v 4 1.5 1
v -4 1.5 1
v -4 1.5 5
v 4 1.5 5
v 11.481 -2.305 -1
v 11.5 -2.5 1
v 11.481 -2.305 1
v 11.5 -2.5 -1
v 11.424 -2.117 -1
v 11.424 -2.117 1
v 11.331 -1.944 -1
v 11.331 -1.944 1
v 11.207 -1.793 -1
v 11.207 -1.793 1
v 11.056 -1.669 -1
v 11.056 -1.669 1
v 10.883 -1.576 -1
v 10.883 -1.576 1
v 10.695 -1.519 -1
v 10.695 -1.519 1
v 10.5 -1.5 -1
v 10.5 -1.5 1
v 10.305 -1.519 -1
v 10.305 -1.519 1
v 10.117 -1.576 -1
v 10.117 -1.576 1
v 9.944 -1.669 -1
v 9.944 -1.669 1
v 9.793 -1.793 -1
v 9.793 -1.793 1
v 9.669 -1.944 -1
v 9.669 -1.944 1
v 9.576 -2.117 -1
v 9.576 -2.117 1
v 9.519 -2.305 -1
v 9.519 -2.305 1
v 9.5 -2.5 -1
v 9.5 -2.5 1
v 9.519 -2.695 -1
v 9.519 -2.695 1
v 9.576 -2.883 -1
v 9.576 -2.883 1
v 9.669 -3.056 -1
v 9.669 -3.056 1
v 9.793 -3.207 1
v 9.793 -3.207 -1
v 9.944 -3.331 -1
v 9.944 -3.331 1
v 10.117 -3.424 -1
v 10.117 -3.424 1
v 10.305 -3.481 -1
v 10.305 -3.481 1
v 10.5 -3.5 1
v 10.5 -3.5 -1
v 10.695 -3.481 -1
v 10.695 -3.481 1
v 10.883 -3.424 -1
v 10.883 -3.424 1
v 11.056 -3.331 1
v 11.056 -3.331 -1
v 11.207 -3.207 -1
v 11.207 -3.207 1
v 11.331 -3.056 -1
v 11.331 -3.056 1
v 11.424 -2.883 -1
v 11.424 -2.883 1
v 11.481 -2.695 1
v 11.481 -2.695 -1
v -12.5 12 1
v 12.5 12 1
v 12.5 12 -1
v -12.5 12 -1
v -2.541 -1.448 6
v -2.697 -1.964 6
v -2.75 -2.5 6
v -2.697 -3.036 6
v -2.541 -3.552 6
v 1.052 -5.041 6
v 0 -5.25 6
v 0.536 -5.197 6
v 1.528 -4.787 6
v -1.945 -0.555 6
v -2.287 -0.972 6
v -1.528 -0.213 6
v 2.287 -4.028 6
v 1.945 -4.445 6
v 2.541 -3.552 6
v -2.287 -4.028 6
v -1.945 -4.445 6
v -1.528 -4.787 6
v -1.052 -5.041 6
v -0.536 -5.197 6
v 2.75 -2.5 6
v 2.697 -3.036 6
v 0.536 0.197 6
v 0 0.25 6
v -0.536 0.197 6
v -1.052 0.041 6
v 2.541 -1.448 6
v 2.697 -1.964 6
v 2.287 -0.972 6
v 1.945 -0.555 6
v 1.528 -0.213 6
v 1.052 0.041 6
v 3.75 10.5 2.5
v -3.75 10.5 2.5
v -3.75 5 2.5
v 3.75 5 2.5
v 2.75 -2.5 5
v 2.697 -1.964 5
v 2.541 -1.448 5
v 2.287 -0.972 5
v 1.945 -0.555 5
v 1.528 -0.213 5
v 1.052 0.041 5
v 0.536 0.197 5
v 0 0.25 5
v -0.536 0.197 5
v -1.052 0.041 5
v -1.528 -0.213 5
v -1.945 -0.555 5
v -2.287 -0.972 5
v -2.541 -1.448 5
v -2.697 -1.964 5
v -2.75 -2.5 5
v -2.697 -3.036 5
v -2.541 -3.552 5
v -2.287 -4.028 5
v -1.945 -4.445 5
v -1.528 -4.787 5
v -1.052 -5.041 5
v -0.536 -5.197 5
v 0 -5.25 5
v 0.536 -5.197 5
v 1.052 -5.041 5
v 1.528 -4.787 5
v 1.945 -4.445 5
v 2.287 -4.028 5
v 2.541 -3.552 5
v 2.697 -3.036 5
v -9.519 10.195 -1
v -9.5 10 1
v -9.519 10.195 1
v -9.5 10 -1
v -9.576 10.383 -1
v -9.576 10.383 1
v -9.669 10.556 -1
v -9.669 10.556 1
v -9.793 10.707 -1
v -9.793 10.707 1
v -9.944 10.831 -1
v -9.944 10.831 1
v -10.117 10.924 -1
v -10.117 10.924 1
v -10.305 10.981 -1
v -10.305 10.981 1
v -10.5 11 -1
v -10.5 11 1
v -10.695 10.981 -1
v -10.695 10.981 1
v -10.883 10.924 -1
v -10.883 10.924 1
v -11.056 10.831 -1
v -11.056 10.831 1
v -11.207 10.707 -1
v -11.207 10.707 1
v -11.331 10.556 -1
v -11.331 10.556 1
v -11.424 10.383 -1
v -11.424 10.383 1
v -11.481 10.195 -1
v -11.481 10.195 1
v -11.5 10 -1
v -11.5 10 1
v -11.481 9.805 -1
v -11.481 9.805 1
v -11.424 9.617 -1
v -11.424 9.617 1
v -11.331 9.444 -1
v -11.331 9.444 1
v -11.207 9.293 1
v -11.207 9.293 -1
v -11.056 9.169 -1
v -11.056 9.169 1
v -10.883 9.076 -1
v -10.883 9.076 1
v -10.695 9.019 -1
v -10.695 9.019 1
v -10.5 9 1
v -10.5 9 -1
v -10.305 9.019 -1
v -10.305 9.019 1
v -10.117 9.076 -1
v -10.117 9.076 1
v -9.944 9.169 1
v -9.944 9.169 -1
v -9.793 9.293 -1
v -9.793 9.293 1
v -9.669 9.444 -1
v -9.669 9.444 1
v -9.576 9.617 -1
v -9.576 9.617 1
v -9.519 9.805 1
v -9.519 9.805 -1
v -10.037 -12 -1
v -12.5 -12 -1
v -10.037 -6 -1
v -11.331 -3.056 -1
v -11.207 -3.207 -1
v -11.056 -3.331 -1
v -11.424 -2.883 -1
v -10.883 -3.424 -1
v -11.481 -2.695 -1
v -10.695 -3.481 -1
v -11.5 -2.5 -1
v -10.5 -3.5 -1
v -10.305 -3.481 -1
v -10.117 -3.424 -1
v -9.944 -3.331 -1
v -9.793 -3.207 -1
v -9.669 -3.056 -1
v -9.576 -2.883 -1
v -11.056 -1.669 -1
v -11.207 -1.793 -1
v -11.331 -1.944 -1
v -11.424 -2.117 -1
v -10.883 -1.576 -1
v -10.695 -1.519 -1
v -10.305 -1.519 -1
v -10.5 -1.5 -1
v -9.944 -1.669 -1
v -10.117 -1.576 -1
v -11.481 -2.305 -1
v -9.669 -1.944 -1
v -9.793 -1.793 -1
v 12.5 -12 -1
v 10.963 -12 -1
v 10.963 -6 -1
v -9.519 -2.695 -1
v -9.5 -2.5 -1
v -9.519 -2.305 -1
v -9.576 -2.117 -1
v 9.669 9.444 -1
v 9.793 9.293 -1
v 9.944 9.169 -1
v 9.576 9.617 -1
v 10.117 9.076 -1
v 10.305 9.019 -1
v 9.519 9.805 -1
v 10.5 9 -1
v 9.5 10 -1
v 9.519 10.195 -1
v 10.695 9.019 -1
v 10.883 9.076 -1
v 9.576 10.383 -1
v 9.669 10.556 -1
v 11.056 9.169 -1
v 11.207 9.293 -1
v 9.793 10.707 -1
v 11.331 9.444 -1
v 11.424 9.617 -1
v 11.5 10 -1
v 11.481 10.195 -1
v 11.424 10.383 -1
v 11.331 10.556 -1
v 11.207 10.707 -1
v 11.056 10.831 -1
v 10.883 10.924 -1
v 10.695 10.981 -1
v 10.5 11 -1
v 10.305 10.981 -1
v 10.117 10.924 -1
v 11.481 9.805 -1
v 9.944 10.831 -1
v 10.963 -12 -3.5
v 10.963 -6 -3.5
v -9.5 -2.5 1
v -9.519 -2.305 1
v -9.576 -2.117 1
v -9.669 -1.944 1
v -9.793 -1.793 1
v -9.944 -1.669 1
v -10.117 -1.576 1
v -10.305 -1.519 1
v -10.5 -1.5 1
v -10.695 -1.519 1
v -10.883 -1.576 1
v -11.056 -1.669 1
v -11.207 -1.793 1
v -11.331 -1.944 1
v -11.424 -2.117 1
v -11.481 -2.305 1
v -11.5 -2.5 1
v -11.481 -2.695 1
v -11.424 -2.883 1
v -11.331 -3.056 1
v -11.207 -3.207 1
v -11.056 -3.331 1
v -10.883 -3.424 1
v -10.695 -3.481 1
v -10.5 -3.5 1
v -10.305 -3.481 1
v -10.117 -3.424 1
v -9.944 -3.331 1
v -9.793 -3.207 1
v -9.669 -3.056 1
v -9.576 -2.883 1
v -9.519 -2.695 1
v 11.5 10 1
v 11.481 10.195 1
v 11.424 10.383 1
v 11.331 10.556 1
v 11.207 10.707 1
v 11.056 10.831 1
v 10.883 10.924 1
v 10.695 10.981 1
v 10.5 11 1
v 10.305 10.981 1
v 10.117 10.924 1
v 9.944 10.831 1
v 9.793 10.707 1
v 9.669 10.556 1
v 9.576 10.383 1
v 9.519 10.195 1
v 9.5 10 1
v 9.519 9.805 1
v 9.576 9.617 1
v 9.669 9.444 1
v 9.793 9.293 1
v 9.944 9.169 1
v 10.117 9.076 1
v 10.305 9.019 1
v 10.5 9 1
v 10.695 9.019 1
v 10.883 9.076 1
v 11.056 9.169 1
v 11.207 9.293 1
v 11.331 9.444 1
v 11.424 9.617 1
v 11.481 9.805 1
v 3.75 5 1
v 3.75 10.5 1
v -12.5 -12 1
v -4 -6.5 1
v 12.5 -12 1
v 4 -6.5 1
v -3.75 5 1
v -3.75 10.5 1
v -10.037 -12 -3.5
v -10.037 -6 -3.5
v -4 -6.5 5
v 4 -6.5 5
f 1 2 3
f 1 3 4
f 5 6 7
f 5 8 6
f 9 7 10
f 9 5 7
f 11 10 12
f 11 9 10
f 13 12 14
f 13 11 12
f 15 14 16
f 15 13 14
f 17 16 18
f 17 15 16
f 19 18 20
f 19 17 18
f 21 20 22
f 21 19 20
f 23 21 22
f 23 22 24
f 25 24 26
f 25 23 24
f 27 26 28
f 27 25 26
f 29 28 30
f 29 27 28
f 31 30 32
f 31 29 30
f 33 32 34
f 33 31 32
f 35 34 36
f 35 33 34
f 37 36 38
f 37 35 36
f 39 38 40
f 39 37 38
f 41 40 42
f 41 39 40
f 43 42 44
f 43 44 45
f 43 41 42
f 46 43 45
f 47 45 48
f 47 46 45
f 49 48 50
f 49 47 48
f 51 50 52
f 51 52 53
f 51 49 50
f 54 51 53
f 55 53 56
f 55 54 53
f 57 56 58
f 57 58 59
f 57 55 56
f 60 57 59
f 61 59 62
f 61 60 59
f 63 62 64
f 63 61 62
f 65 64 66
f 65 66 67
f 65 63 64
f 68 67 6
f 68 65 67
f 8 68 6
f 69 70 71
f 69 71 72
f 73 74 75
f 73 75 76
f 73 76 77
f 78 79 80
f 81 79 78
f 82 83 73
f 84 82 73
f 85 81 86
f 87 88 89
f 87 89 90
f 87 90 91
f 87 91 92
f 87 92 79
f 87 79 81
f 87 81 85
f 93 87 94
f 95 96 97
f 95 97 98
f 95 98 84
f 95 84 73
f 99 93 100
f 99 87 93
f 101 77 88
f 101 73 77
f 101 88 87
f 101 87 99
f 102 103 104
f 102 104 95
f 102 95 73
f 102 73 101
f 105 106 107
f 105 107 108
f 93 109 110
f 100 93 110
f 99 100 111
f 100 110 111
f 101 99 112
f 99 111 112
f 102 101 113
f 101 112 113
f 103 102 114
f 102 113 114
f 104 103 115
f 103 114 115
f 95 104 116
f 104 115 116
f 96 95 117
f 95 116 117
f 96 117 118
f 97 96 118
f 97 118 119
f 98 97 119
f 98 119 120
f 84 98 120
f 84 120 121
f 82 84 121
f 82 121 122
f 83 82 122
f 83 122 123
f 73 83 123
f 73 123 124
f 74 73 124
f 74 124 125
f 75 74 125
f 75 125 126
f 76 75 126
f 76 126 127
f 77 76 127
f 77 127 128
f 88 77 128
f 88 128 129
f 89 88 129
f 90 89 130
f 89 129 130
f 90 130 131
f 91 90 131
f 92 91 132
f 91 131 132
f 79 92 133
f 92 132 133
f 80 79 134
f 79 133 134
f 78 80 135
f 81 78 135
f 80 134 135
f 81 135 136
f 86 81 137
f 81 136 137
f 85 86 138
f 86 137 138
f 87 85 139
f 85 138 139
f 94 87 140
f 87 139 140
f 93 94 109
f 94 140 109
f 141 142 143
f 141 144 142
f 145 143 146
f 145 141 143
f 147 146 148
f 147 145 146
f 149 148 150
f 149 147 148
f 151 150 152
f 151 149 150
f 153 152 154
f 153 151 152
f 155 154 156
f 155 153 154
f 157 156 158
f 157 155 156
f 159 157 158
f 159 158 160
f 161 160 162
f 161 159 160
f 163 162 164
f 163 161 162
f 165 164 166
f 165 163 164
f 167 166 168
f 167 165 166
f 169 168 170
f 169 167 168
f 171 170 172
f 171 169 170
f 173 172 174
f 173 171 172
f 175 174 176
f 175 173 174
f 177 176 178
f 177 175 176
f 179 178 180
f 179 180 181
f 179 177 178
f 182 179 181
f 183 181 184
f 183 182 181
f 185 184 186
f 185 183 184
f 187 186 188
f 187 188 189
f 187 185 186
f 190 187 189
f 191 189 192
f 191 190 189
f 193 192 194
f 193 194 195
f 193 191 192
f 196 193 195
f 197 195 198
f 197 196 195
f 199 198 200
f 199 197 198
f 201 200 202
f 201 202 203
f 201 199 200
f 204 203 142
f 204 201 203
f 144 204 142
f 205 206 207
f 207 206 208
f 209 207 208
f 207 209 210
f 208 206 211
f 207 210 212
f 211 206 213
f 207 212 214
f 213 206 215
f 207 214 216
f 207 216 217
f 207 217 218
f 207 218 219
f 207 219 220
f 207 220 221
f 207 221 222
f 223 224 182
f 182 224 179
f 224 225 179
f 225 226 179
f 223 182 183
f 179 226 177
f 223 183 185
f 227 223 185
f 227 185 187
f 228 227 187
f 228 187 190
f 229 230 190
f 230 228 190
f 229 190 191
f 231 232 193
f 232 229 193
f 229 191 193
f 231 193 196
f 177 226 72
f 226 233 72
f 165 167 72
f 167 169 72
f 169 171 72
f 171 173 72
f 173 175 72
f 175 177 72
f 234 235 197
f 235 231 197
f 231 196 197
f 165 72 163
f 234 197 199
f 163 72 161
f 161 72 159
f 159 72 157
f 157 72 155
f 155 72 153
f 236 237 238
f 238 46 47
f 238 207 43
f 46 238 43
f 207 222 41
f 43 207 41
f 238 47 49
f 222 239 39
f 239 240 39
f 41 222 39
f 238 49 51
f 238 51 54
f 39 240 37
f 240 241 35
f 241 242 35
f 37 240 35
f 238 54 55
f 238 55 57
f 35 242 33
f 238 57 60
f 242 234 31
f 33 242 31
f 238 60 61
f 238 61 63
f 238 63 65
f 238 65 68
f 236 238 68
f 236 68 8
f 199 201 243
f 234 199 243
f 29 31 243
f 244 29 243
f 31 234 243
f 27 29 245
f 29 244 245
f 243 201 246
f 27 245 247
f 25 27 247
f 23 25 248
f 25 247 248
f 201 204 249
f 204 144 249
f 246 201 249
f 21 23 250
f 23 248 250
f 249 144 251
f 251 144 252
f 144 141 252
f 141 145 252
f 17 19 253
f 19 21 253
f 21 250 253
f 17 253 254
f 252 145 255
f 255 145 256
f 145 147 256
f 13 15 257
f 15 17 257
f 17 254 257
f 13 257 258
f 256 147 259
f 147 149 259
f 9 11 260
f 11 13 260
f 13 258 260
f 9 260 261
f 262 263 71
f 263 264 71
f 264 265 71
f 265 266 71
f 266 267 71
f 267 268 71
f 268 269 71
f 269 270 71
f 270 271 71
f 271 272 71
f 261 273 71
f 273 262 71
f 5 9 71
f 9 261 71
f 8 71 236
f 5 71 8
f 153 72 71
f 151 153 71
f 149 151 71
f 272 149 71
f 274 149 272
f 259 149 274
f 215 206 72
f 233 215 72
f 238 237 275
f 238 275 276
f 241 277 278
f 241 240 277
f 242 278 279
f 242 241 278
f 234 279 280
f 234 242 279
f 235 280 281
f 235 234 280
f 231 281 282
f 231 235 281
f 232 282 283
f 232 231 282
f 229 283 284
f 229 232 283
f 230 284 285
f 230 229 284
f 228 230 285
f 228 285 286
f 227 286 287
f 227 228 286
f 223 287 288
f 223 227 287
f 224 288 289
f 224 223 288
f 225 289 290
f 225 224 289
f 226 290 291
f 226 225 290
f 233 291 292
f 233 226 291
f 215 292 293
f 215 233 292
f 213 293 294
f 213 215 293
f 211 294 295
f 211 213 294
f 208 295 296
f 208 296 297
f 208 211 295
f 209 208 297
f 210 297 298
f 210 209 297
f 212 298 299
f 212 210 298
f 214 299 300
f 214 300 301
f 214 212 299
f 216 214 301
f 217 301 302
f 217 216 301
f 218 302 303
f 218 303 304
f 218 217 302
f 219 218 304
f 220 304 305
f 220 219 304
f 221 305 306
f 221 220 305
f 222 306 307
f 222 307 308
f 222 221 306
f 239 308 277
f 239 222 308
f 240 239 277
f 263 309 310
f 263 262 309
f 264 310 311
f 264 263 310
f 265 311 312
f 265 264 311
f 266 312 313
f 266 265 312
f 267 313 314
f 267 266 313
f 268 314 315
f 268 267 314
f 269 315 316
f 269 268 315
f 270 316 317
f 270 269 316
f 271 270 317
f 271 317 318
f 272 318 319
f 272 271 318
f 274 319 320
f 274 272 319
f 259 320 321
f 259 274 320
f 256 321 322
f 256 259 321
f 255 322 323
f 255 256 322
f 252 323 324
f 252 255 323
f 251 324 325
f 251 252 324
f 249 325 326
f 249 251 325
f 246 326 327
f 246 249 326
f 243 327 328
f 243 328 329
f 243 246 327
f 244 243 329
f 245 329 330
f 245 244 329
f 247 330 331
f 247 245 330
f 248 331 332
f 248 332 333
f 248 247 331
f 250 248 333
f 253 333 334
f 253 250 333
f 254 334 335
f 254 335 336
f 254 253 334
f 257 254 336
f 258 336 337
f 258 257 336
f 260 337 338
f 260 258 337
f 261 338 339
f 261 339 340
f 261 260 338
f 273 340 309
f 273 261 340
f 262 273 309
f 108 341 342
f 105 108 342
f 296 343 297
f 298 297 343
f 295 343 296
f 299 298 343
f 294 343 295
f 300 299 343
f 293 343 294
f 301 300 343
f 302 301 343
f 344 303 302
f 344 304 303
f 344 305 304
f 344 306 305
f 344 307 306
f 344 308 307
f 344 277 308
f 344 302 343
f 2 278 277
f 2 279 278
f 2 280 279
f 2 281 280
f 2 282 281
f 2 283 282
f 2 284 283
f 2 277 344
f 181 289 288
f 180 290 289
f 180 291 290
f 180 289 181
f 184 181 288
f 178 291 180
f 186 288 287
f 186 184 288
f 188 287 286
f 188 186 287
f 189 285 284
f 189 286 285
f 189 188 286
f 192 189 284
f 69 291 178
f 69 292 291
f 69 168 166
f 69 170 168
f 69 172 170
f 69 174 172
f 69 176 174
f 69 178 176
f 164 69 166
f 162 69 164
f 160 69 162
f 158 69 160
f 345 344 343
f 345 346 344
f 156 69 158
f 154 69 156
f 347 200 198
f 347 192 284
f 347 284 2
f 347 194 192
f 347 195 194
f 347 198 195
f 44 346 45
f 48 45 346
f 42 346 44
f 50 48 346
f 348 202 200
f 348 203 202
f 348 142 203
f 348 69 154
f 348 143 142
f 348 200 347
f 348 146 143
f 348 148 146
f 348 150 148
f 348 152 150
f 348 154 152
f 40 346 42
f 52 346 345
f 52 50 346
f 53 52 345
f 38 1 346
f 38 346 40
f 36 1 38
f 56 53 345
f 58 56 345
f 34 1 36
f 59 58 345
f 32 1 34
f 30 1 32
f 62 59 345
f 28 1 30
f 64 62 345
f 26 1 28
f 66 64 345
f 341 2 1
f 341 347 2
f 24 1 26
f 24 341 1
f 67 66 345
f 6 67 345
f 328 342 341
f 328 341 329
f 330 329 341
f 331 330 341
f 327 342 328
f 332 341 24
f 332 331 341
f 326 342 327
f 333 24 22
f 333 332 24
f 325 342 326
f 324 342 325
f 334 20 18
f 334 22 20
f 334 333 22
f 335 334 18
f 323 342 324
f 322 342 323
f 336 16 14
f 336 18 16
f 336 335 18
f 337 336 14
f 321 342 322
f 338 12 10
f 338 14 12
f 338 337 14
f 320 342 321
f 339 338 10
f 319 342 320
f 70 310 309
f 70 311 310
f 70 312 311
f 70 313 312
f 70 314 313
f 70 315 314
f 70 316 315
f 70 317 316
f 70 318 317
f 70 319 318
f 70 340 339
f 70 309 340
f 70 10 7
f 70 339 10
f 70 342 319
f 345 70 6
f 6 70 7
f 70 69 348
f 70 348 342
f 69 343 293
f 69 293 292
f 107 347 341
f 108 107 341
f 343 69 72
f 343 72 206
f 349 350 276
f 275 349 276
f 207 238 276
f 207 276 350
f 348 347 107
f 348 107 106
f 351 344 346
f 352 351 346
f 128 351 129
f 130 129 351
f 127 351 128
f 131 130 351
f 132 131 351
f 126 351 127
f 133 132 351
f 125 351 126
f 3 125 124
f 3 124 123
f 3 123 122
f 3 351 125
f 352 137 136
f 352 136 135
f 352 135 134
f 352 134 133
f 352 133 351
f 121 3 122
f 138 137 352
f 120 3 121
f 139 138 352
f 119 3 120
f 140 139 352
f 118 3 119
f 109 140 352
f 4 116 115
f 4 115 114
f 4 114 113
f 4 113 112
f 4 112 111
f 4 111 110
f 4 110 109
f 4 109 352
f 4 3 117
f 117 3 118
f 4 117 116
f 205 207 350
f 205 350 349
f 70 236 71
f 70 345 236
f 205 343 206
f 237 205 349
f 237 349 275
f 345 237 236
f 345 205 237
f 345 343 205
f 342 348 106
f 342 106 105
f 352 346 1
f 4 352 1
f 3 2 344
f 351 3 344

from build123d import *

# Parameters (mm, degrees)
F0_R     = 1
F0_W     = 7.5
F0_H     = 5.5
F0_W_2   = 8
F0_H_2   = 7.5
F0_R_2   = 2.75
F0_H_3   = 0.5
F1_DEPTH = 1
F2_DEPTH = 3.5
F3_DEPTH = 5
F4_DEPTH = 6
F5_DEPTH = 2.5


with BuildPart() as f1:
    # F0 (on Top) → F1 (new body, symmetric)
    with BuildSketch(Plane.XY):
        Polygon((-10.037144646, -6), (-10.037144646, -12), (10.962855354, -12), (10.962855354, -6), (4, -6), (4, -6.5), (-4, -6.5), (-4, -6), align=None)
        Polygon((12.5, 12), (-12.5, 12), (-12.5, -12), (-10.037144646, -12), (-10.037144646, -6), (-4, -6), (-4, 1.5), (4, 1.5), (4, -6), (10.962855354, -6), (10.962855354, -12), (12.5, -12), align=None)
        with Locations((-10.5, -2.5)):
            Circle(F0_R, mode=Mode.SUBTRACT)
        with Locations((10.5, -2.5)):
            Circle(F0_R, mode=Mode.SUBTRACT)
        with Locations((-10.5, 10)):
            Circle(F0_R, mode=Mode.SUBTRACT)
        with Locations((0, 7.75)):
            Rectangle(F0_W, F0_H, mode=Mode.SUBTRACT)
        with Locations((10.5, 10)):
            Circle(F0_R, mode=Mode.SUBTRACT)
        with Locations((0, 7.75)):
            Rectangle(F0_W, F0_H)
        with Locations((0, -2.25)):
            Rectangle(F0_W_2, F0_H_2)
        with Locations((0, -2.5)):
            Circle(F0_R_2, mode=Mode.SUBTRACT)
        with Locations((0, -2.5)):
            Circle(F0_R_2)
        with Locations((0, -6.25)):
            Rectangle(F0_W_2, F0_H_3)
    extrude(amount=F1_DEPTH, both=True)

    # F0 (on Top) → F2 (join)
    with BuildSketch(Plane.XY):
        Polygon((-10.037144646, -6), (-10.037144646, -12), (10.962855354, -12), (10.962855354, -6), (4, -6), (4, -6.5), (-4, -6.5), (-4, -6), align=None)
        with Locations((0, -6.25)):
            Rectangle(F0_W_2, F0_H_3)
    extrude(amount=-F2_DEPTH)

    # F0 (on Top) → F3 (join)
    with BuildSketch(Plane.XY):
        with Locations((0, -2.25)):
            Rectangle(F0_W_2, F0_H_2)
        with Locations((0, -2.5)):
            Circle(F0_R_2, mode=Mode.SUBTRACT)
        with Locations((0, -2.5)):
            Circle(F0_R_2)
        with Locations((0, -6.25)):
            Rectangle(F0_W_2, F0_H_3)
    extrude(amount=F3_DEPTH)

    # F0 (on Top) → F4 (join)
    with BuildSketch(Plane.XY):
        with Locations((0, -2.5)):
            Circle(F0_R_2)
    extrude(amount=F4_DEPTH)

    # F0 (on Top) → F5 (join)
    with BuildSketch(Plane.XY):
        with Locations((0, 7.75)):
            Rectangle(F0_W, F0_H)
    extrude(amount=F5_DEPTH)


solid = f1.part
